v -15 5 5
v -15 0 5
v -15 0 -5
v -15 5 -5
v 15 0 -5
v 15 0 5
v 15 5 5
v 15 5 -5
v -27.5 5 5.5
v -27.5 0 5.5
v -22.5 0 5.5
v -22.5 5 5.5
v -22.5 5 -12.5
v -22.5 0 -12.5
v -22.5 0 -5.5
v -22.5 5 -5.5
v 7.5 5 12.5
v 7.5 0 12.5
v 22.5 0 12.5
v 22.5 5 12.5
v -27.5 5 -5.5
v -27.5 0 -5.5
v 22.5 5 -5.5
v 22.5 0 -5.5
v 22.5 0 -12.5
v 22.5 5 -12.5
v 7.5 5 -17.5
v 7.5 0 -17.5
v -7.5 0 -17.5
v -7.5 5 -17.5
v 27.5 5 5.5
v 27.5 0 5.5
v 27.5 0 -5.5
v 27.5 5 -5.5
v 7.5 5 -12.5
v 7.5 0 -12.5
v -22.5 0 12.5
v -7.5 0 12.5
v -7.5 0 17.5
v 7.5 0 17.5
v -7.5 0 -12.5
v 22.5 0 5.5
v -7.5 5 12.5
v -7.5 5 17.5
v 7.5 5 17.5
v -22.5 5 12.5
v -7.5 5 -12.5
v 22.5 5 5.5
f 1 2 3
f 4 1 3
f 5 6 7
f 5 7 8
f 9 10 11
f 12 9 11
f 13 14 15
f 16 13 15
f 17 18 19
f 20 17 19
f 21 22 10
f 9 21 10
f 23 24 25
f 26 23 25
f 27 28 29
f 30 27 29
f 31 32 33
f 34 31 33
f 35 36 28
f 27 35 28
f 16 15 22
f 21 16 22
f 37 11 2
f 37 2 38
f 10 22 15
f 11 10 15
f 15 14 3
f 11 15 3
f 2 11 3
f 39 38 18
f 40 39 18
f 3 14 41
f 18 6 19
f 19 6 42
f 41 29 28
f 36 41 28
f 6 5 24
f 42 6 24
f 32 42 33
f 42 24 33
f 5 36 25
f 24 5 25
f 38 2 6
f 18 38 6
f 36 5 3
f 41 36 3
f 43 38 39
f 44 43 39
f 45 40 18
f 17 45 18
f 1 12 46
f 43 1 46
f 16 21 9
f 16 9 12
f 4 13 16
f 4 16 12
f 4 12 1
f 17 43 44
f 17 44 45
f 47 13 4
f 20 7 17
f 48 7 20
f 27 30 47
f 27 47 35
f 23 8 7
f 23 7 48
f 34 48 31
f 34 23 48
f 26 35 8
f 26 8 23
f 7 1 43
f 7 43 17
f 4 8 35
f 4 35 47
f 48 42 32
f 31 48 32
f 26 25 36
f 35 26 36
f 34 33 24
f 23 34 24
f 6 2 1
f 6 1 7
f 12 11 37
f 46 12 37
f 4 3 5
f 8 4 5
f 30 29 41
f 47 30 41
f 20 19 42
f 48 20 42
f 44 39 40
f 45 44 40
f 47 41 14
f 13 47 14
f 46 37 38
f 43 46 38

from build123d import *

# Parameters (mm, degrees)
SKETCH1_W           = 30
SKETCH1_H           = 10
BOSS_EXTRUDE1_DEPTH = 5


with BuildPart() as part:
    # Sketch1 → Boss-Extrude1 (new body)
    with BuildSketch(Plane(origin=(0, 0, 0), x_dir=(1, 0, 0), z_dir=(0, 1, 0))):
        Polygon((-22.5, -12.5), (-7.5, -12.5), (-7.5, -17.5), (7.5, -17.5), (7.5, -12.5), (22.5, -12.5), (22.5, -5.5), (27.5, -5.5), (27.5, 5.5), (22.5, 5.5), (22.5, 12.5), (7.5, 12.5), (7.5, 17.5), (-7.5, 17.5), (-7.5, 12.5), (-22.5, 12.5), (-22.5, 5.5), (-27.5, 5.5), (-27.5, -5.5), (-22.5, -5.5), align=None)
        Rectangle(SKETCH1_W, SKETCH1_H, mode=Mode.SUBTRACT)
    extrude(amount=BOSS_EXTRUDE1_DEPTH)


solid = part.part
